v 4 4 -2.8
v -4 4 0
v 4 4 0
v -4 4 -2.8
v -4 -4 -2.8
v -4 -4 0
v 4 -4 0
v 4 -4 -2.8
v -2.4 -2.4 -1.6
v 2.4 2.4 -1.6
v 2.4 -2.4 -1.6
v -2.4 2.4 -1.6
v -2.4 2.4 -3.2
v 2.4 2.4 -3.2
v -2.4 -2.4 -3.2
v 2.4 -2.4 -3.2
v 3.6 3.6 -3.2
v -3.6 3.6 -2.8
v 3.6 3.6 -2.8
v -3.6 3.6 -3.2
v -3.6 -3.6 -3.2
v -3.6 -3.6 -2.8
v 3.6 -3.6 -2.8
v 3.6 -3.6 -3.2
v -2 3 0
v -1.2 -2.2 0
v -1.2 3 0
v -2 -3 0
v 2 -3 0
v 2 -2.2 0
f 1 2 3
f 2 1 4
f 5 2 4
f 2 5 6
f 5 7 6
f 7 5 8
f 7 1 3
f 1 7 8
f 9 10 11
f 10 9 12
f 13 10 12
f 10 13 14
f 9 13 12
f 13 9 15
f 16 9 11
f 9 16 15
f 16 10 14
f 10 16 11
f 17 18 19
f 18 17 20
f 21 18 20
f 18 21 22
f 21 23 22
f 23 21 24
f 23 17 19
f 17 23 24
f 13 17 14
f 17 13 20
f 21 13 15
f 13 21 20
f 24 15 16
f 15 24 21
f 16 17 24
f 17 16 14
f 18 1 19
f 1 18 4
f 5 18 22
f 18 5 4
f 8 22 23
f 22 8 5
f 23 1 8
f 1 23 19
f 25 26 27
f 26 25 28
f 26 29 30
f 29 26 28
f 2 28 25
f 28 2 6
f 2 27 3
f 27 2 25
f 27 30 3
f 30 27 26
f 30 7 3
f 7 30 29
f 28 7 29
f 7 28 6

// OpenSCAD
// file: ../p/box5.scad
use <../lib.scad>
function ldraw_lib__box5() = [
// 0 Box with 5 Faces and All Edges
// 0 Name: box5.dat
// 0 Author: James Jessiman
// 0 !LDRAW_ORG Primitive UPDATE 2012-01
// 0 !LICENSE Licensed under CC BY 4.0 : see CAreadme.txt
// 
// 0 BFC CERTIFY CCW
  [0,"BFC","CERTIFY"],
  [0,"BFC","CCW"],
// 
// 0 !HISTORY 2002-04-03 [sbliss] Modified for BFC compliance
// 0 !HISTORY 2002-04-25 [PTadmin] Official Update 2002-02
// 0 !HISTORY 2007-06-24 [PTadmin] Header formatted for Contributor Agreement
// 0 !HISTORY 2008-07-01 [PTadmin] Official Update 2008-01
// 0 !HISTORY 2012-02-16 [Philo] Changed to CCW
// 0 !HISTORY 2012-03-30 [PTadmin] Official Update 2012-01
// 
// 
// 2 24 1 1 1 -1 1 1
  [2,24,1,1,1,-1,1,1],
// 2 24 -1 1 1 -1 1 -1
  [2,24,-1,1,1,-1,1,-1],
// 2 24 -1 1 -1 1 1 -1
  [2,24,-1,1,-1,1,1,-1],
// 2 24 1 1 -1 1 1 1
  [2,24,1,1,-1,1,1,1],
// 2 24 1 0 1 -1 0 1
  [2,24,1,0,1,-1,0,1],
// 2 24 -1 0 1 -1 0 -1
  [2,24,-1,0,1,-1,0,-1],
// 2 24 -1 0 -1 1 0 -1
  [2,24,-1,0,-1,1,0,-1],
// 2 24 1 0 -1 1 0 1
  [2,24,1,0,-1,1,0,1],
// 2 24 1 0 1 1 1 1
  [2,24,1,0,1,1,1,1],
// 2 24 -1 0 1 -1 1 1
  [2,24,-1,0,1,-1,1,1],
// 2 24 1 0 -1 1 1 -1
  [2,24,1,0,-1,1,1,-1],
// 2 24 -1 0 -1 -1 1 -1
  [2,24,-1,0,-1,-1,1,-1],
// 4 16 -1 1 1 1 1 1 1 1 -1 -1 1 -1
  [4,16,-1,1,1,1,1,1,1,1,-1,-1,1,-1],
// 4 16 -1 1 1 -1 0 1 1 0 1 1 1 1
  [4,16,-1,1,1,-1,0,1,1,0,1,1,1,1],
// 4 16 -1 1 -1 -1 0 -1 -1 0 1 -1 1 1
  [4,16,-1,1,-1,-1,0,-1,-1,0,1,-1,1,1],
// 4 16 1 1 -1 1 0 -1 -1 0 -1 -1 1 -1
  [4,16,1,1,-1,1,0,-1,-1,0,-1,-1,1,-1],
// 4 16 1 1 1 1 0 1 1 0 -1 1 1 -1
  [4,16,1,1,1,1,0,1,1,0,-1,1,1,-1],
];
module ldraw_lib__box5(step=0, col=false, unit=2/5, alt=false, line=0.2, solid=!$preview)
    makepoly(ldraw_lib__box5(), step=step, col=col, unit=unit, alt=alt, line=line, solid=solid);
ldraw_lib__box5(line=0.2);
// file: ../p/box4.scad
use <../lib.scad>
function ldraw_lib__box4() = [
// 0 Box with 4 Faces (2 Parallel Pairs) and All Edges
// 0 Name: box4.dat
// 0 Author: James Jessiman
// 0 !LDRAW_ORG Primitive UPDATE 2012-01
// 0 !LICENSE Licensed under CC BY 4.0 : see CAreadme.txt
// 
// 0 BFC CERTIFY CCW
  [0,"BFC","CERTIFY"],
  [0,"BFC","CCW"],
// 
// 0 !HISTORY 2002-04-03 [sbliss] Modified for BFC compliance
// 0 !HISTORY 2002-04-25 [PTadmin] Official Update 2002-02
// 0 !HISTORY 2007-06-24 [PTadmin] Header formatted for Contributor Agreement
// 0 !HISTORY 2008-07-01 [PTadmin] Official Update 2008-01
// 0 !HISTORY 2012-02-16 [Philo] Changed to CCW
// 0 !HISTORY 2012-03-30 [PTadmin] Official Update 2012-01
// 
// 
// 2 24 1 1 1 -1 1 1
  [2,24,1,1,1,-1,1,1],
// 2 24 -1 1 1 -1 1 -1
  [2,24,-1,1,1,-1,1,-1],
// 2 24 -1 1 -1 1 1 -1
  [2,24,-1,1,-1,1,1,-1],
// 2 24 1 1 -1 1 1 1
  [2,24,1,1,-1,1,1,1],
// 2 24 1 0 1 -1 0 1
  [2,24,1,0,1,-1,0,1],
// 2 24 -1 0 1 -1 0 -1
  [2,24,-1,0,1,-1,0,-1],
// 2 24 -1 0 -1 1 0 -1
  [2,24,-1,0,-1,1,0,-1],
// 2 24 1 0 -1 1 0 1
  [2,24,1,0,-1,1,0,1],
// 2 24 1 0 1 1 1 1
  [2,24,1,0,1,1,1,1],
// 2 24 -1 0 1 -1 1 1
  [2,24,-1,0,1,-1,1,1],
// 2 24 1 0 -1 1 1 -1
  [2,24,1,0,-1,1,1,-1],
// 2 24 -1 0 -1 -1 1 -1
  [2,24,-1,0,-1,-1,1,-1],
// 4 16 -1 1 1 -1 0 1 1 0 1 1 1 1
  [4,16,-1,1,1,-1,0,1,1,0,1,1,1,1],
// 4 16 -1 1 -1 -1 0 -1 -1 0 1 -1 1 1
  [4,16,-1,1,-1,-1,0,-1,-1,0,1,-1,1,1],
// 4 16 1 1 -1 1 0 -1 -1 0 -1 -1 1 -1
  [4,16,1,1,-1,1,0,-1,-1,0,-1,-1,1,-1],
// 4 16 1 1 1 1 0 1 1 0 -1 1 1 -1
  [4,16,1,1,1,1,0,1,1,0,-1,1,1,-1],
];
module ldraw_lib__box4(step=0, col=false, unit=2/5, alt=false, line=0.2, solid=!$preview)
    makepoly(ldraw_lib__box4(), step=step, col=col, unit=unit, alt=alt, line=line, solid=solid);
ldraw_lib__box4(line=0.2);
// file: s/3070bs01.scad
use <../../lib.scad>
use <../../p/box4.scad>
use <../../p/box5.scad>
function ldraw_lib__s__3070bs01() = [
// 0 ~Tile  1 x  1 with Groove without Top Face
// 0 Name: s\3070bs01.dat
// 0 Author: Chris Dee [cwdee]
// 0 !LDRAW_ORG Subpart UPDATE 2009-02
// 0 !LICENSE Licensed under CC BY 4.0 : see CAreadme.txt
// 
// 0 BFC CERTIFY CCW
  [0,"BFC","CERTIFY"],
  [0,"BFC","CCW"],
// 
// 0 !HISTORY 2009-09-03 [PTadmin] Official Update 2009-02
// 
// 
// 1 16 0 0 0 10 0 0 0 7 0 0 0 10 box4.dat
  [1,16,0,0,0,10,0,0,0,7,0,0,0,10, ldraw_lib__box4()],
// 0 BFC INVERTNEXT
  [0,"BFC","INVERTNEXT"],
// 1 16 0 8 0 6 0 0 0 -4 0 0 0 6 box5.dat
  [1,16,0,8,0,6,0,0,0,-4,0,0,0,6, ldraw_lib__box5()],
// 1 16 0 7 0 9 0 0 0 1 0 0 0 9 box4.dat
  [1,16,0,7,0,9,0,0,0,1,0,0,0,9, ldraw_lib__box4()],
// 
// 4 16 9 8 9 6 8 6 -6 8 6 -9 8 9
  [4,16,9,8,9,6,8,6,-6,8,6,-9,8,9],
// 4 16 -9 8 9 -6 8 6 -6 8 -6 -9 8 -9
  [4,16,-9,8,9,-6,8,6,-6,8,-6,-9,8,-9],
// 4 16 -9 8 -9 -6 8 -6 6 8 -6 9 8 -9
  [4,16,-9,8,-9,-6,8,-6,6,8,-6,9,8,-9],
// 4 16 9 8 -9 6 8 -6 6 8 6 9 8 9
  [4,16,9,8,-9,6,8,-6,6,8,6,9,8,9],
// 
// 4 16 10 7 10 9 7 9 -9 7 9 -10 7 10
  [4,16,10,7,10,9,7,9,-9,7,9,-10,7,10],
// 4 16 -10 7 10 -9 7 9 -9 7 -9 -10 7 -10
  [4,16,-10,7,10,-9,7,9,-9,7,-9,-10,7,-10],
// 4 16 -10 7 -10 -9 7 -9 9 7 -9 10 7 -10
  [4,16,-10,7,-10,-9,7,-9,9,7,-9,10,7,-10],
// 4 16 10 7 -10 9 7 -9 9 7 9 10 7 10
  [4,16,10,7,-10,9,7,-9,9,7,9,10,7,10],
// 0
];
module ldraw_lib__s__3070bs01(step=0, col=false, unit=2/5, alt=false, line=0.2, solid=!$preview)
    makepoly(ldraw_lib__s__3070bs01(), step=step, col=col, unit=unit, alt=alt, line=line, solid=solid);
ldraw_lib__s__3070bs01(line=0.2);
// file: s/3070batl.scad
use <../../lib.scad>
function ldraw_lib__s__3070batl() = [
// 0 ~Tile  1 x  1 with "L" Pattern
// 0 Name: s\3070batl.dat
// 0 Author: Chris Dee [cwdee]
// 0 !LDRAW_ORG Subpart UPDATE 2009-01
// 0 !LICENSE Licensed under CC BY 4.0 : see CAreadme.txt
// 
// 0 BFC CERTIFY CW
  [0,"BFC","CERTIFY"],
  [0,"BFC","CW"],
// 
// 0 !HISTORY 2009-05-02 [PTadmin] Official Update 2009-01
// 
// 
// 4 16 -3 0 -5.5 -5 0 -7.5 -5 0 7.5 -3 0 7.5
  [4,16,-3,0,-5.5,-5,0,-7.5,-5,0,7.5,-3,0,7.5],
// 4 16 -3 0 -5.5 5 0 -5.5 5 0 -7.5 -5 0 -7.5
  [4,16,-3,0,-5.5,5,0,-5.5,5,0,-7.5,-5,0,-7.5],
// 0
];
module ldraw_lib__s__3070batl(step=0, col=false, unit=2/5, alt=false, line=0.2, solid=!$preview)
    makepoly(ldraw_lib__s__3070batl(), step=step, col=col, unit=unit, alt=alt, line=line, solid=solid);
ldraw_lib__s__3070batl(line=0.2);
// main file
use <../lib.scad>
use <s/3070batl.scad>
use <s/3070bs01.scad>
function ldraw_lib__3070bptl() = [
// 0 Tile  1 x  1 with Silver "L" Pattern
// 0 Name: 3070bptl.dat
// 0 Author: Chris Dee [cwdee]
// 0 !LDRAW_ORG Part UPDATE 2013-01
// 0 !LICENSE Licensed under CC BY 4.0 : see CAreadme.txt
// 
// 0 BFC CERTIFY CW
  [0,"BFC","CERTIFY"],
  [0,"BFC","CW"],
// 
// 0 !KEYWORDS BrickLink 3070pb020, Rebrickable 3070bpr0074, Set 4677
// 
// 0 !HISTORY 2009-05-02 [PTadmin] Official Update 2009-01
// 0 !HISTORY 2013-03-09 [MagFors] Changed colour 383 to 80 (printed silver)
// 0 !HISTORY 2013-07-21 [PTadmin] Official Update 2013-01
// 
// 
// 1 16 0 0 0 1 0 0 0 1 0 0 0 1 s\3070bs01.dat
  [1,16,0,0,0,1,0,0,0,1,0,0,0,1, ldraw_lib__s__3070bs01()],
// 1 80 0 0 0 1 0 0 0 1 0 0 0 1 s\3070batl.dat
  [1,80,0,0,0,1,0,0,0,1,0,0,0,1, ldraw_lib__s__3070batl()],
// 4 16 -5 0 -7.5 -10 0 -10 -10 0 10 -5 0 7.5
  [4,16,-5,0,-7.5,-10,0,-10,-10,0,10,-5,0,7.5],
// 4 16 -5 0 7.5 -10 0 10 10 0 10 -3 0 7.5
  [4,16,-5,0,7.5,-10,0,10,10,0,10,-3,0,7.5],
// 4 16 -3 0 7.5 10 0 10 5 0 -5.5 -3 0 -5.5
  [4,16,-3,0,7.5,10,0,10,5,0,-5.5,-3,0,-5.5],
// 4 16 5 0 -5.5 10 0 10 10 0 -10 5 0 -7.5
  [4,16,5,0,-5.5,10,0,10,10,0,-10,5,0,-7.5],
// 4 16 5 0 -7.5 10 0 -10 -10 0 -10 -5 0 -7.5
  [4,16,5,0,-7.5,10,0,-10,-10,0,-10,-5,0,-7.5],
// 
];
module ldraw_lib__3070bptl(step=0, col=false, unit=2/5, alt=false, line=0.2, solid=!$preview)
    makepoly(ldraw_lib__3070bptl(), step=step, col=col, unit=unit, alt=alt, line=line, solid=solid);
ldraw_lib__3070bptl(line=0.2);
